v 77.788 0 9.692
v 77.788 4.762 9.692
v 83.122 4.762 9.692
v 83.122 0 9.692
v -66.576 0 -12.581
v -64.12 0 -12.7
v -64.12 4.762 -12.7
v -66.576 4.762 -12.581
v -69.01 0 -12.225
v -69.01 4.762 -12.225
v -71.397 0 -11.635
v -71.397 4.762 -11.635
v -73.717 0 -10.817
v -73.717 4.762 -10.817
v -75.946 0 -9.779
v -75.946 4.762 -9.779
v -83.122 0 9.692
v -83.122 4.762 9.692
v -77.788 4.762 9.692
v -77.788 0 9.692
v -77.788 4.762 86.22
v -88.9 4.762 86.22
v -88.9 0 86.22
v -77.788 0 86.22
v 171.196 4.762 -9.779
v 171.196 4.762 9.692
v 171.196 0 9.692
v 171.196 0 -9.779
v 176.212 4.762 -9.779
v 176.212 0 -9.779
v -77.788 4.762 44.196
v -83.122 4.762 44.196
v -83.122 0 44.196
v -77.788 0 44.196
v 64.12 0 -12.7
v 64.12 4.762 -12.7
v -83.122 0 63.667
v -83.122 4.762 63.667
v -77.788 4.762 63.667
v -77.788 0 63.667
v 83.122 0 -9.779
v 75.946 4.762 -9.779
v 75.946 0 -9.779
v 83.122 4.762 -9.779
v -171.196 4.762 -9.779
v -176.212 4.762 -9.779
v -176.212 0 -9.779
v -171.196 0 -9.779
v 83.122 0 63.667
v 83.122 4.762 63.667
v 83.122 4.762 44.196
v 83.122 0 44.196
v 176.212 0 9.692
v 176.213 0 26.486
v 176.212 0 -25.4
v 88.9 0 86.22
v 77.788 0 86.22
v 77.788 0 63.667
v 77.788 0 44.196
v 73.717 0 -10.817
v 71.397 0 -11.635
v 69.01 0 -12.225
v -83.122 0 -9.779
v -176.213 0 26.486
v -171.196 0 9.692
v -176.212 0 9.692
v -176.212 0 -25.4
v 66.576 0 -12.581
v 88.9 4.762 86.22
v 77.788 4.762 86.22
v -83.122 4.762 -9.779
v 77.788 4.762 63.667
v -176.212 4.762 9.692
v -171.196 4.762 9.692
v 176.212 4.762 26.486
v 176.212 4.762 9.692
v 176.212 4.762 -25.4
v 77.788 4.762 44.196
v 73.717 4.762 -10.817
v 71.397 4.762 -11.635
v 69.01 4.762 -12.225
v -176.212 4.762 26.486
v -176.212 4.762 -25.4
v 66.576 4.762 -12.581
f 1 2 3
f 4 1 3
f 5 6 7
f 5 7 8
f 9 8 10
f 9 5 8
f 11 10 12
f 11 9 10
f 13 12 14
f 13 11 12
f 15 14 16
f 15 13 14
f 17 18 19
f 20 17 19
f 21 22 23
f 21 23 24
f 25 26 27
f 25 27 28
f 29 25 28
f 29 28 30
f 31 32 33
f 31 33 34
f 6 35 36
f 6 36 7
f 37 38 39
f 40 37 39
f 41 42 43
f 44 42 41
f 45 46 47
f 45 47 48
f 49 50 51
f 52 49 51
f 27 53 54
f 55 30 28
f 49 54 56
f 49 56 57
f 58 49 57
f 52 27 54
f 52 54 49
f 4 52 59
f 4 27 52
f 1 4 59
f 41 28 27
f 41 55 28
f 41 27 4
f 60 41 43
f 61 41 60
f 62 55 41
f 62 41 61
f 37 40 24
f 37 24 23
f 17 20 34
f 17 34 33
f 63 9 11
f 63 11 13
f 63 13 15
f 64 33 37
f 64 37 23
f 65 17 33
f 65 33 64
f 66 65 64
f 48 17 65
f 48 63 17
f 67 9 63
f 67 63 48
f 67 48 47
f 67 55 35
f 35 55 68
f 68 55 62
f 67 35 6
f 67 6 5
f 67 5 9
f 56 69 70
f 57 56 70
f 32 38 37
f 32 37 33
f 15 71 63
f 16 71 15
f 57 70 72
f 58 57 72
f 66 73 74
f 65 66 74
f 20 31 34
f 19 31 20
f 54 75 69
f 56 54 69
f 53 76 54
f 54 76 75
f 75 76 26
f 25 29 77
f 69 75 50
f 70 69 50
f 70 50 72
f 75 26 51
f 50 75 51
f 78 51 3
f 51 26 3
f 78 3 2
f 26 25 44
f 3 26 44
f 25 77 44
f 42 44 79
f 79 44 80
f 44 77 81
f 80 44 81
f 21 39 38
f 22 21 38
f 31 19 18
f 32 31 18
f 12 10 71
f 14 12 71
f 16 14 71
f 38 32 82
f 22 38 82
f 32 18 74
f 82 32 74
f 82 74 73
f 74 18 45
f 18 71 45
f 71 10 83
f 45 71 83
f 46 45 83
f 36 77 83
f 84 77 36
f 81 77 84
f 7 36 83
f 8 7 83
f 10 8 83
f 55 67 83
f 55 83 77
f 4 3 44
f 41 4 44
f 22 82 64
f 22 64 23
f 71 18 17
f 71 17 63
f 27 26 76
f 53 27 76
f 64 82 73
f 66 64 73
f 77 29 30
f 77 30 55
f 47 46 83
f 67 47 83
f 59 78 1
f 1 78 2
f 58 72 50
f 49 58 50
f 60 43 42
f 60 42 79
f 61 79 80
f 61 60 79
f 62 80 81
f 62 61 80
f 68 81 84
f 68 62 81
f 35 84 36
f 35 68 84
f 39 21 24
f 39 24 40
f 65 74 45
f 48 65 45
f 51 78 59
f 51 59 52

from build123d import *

# Parameters (mm, degrees)
SKETCH1_W           = 355.6
SKETCH1_H           = 50.8
BOSS_EXTRUDE1_DEPTH = 4.7625
BOSS_EXTRUDE2_DEPTH = 4.7625
SKETCH3_W           = 6.858
SKETCH3_H           = 19.471321321
SKETCH3_W_2         = 6.35
SKETCH3_H_2         = 18.963321321
CUT_EXTRUDE1_DEPTH  = 198.660000053
SKETCH4_W           = 1.5875
SKETCH4_H           = 15.621
SKETCH4_H_2         = 22.553060346
CUT_EXTRUDE2_DEPTH  = 198.660000053
CUT_EXTRUDE3_DEPTH  = 197.233230563
SKETCH6_W           = 0.3175
SKETCH6_H           = 19.471321321
CUT_EXTRUDE4_DEPTH  = 197.233230563
SKETCH7_W           = 155.575
SKETCH7_H           = 76.528060346
CUT_EXTRUDE5_DEPTH  = 197.233230563


with BuildPart() as part:
    # Sketch1 → Boss-Extrude1 (new body)
    with BuildSketch(Plane(origin=(0, 0, 0), x_dir=(1, 0, 0), z_dir=(0, 1, 0))):
        Rectangle(SKETCH1_W, SKETCH1_H)
    extrude(amount=BOSS_EXTRUDE1_DEPTH)

    # Sketch2 → Boss-Extrude2 (add)
    with BuildSketch(Plane(origin=(0, 4.7625, 0), x_dir=(1, 0, 0), z_dir=(0, 1, 0))):
        Polygon((177.8, -25.4), (88.9, -86.220381667), (76.2, -86.220381667), (76.2, -25.4), align=None)
        Polygon((-177.8, -25.4), (-88.9, -86.220381667), (-76.2, -86.220381667), (-76.2, -25.4), align=None)
    extrude(amount=-BOSS_EXTRUDE2_DEPTH)

    # Sketch3 → Cut-Extrude1 (cut, through all)
    # profile 1 of 6: a face of its own
    with BuildSketch(Plane(origin=(0, 4.7625, 0), x_dir=(1, 0, 0), z_dir=(0, 1, 0))):
        with Locations((-174.625, 0.043339339)):
            Rectangle(SKETCH3_W, SKETCH3_H)
        with Locations((-174.625, 0.04333934)):
            Rectangle(SKETCH3_W_2, SKETCH3_H_2, mode=Mode.SUBTRACT)
    # profile 2 of 6: a face of its own
    with BuildSketch(Plane(origin=(0, 4.7625, 0), x_dir=(1, 0, 0), z_dir=(0, 1, 0))):
        with Locations((-79.375, -53.931660661)):
            Rectangle(SKETCH3_W, SKETCH3_H)
        with Locations((-79.375, -53.931660661)):
            Rectangle(SKETCH3_W_2, SKETCH3_H_2, mode=Mode.SUBTRACT)
    # profile 3 of 6: a face of its own
    with BuildSketch(Plane(origin=(0, 4.7625, 0), x_dir=(1, 0, 0), z_dir=(0, 1, 0))):
        with Locations((-79.375, 0.043339339)):
            Rectangle(SKETCH3_W, SKETCH3_H)
        with Locations((-79.375, 0.04333934)):
            Rectangle(SKETCH3_W_2, SKETCH3_H_2, mode=Mode.SUBTRACT)
    # profile 4 of 6: a face of its own
    with BuildSketch(Plane(origin=(0, 4.7625, 0), x_dir=(1, 0, 0), z_dir=(0, 1, 0))):
        with Locations((79.375, 0.043339339)):
            Rectangle(SKETCH3_W, SKETCH3_H)
        with Locations((79.375, 0.04333934)):
            Rectangle(SKETCH3_W_2, SKETCH3_H_2, mode=Mode.SUBTRACT)
    # profile 5 of 6: a face of its own
    with BuildSketch(Plane(origin=(0, 4.7625, 0), x_dir=(1, 0, 0), z_dir=(0, 1, 0))):
        with Locations((79.375, -53.931660661)):
            Rectangle(SKETCH3_W, SKETCH3_H)
        with Locations((79.375, -53.931660661)):
            Rectangle(SKETCH3_W_2, SKETCH3_H_2, mode=Mode.SUBTRACT)
    # profile 6 of 6: a face of its own
    with BuildSketch(Plane(origin=(0, 4.7625, 0), x_dir=(1, 0, 0), z_dir=(0, 1, 0))):
        with Locations((174.625, 0.043339339)):
            Rectangle(SKETCH3_W, SKETCH3_H)
        with Locations((174.625, 0.04333934)):
            Rectangle(SKETCH3_W_2, SKETCH3_H_2, mode=Mode.SUBTRACT)
    extrude(amount=-CUT_EXTRUDE1_DEPTH, mode=Mode.SUBTRACT)


with BuildPart() as body_2:
    # of the pieces the cut leaves, the one that is kept (cut_extrude1_keep)
    add(part.part.solids().sort_by_distance((-177.8, 0, -25.4))[0])

    # Sketch4 → Cut-Extrude2 (cut, through all)
    with BuildSketch(Plane(origin=(0, 4.7625, 0), x_dir=(1, 0, 0), z_dir=(0, 1, 0))):
        with Locations((-177.00625, 17.5895)):
            Rectangle(SKETCH4_W, SKETCH4_H)
        with Locations((177.00625, 17.5895)):
            Rectangle(SKETCH4_W, SKETCH4_H)
        Polygon((-176.2125, -26.486078244), (-176.2125, -9.692321321), (-177.8, -9.692321321), (-177.8, -25.4), align=None)
        Polygon((177.8, -9.692321321), (176.2125, -9.692321321), (176.2125, -26.486078244), (177.8, -25.4), align=None)
        with Locations((-76.99375, -74.943851494)):
            Rectangle(SKETCH4_W, SKETCH4_H_2)
        with Locations((76.99375, -74.943851494)):
            Rectangle(SKETCH4_W, SKETCH4_H_2)
    extrude(amount=-CUT_EXTRUDE2_DEPTH, mode=Mode.SUBTRACT)

    # Sketch5 → Cut-Extrude3 (cut, through all)
    with BuildSketch(Plane(origin=(0, 4.7625, 0), x_dir=(1, 0, 0), z_dir=(0, 1, 0))):
        with BuildLine():
            Line((-76.2, -9.692321321), (-76.2, -25.4))
            Line((-76.2, -25.4), (76.2, -25.4))
            Line((76.2, -25.4), (76.2, -9.692321321))
            Line((76.2, -9.692321321), (75.946, -9.692321321))
            Line((75.946, -9.692321321), (75.946, 9.779))
            ThreePointArc((75.946, 9.779), (70.210694069, 11.958939555), (64.119988035, 12.7))
            Line((64.119988035, 12.7), (-64.119988035, 12.7))
            ThreePointArc((-64.119988035, 12.7), (-70.210694069, 11.958939555), (-75.946, 9.779))
            Line((-75.946, 9.779), (-75.946, -9.692321321))
            Line((-75.946, -9.692321321), (-76.2, -9.692321321))
        make_face()
    extrude(amount=-CUT_EXTRUDE3_DEPTH, mode=Mode.SUBTRACT)

    # Sketch6 → Cut-Extrude4 (cut, through all)
    with BuildSketch(Plane(origin=(0, 4.7625, 0), x_dir=(1, 0, 0), z_dir=(0, 1, 0))):
        with Locations((-82.96275, 0.043339339)):
            Rectangle(SKETCH6_W, SKETCH6_H)
        with Locations((-82.96275, -53.931660661)):
            Rectangle(SKETCH6_W, SKETCH6_H)
        with Locations((82.96275, -53.931660661)):
            Rectangle(SKETCH6_W, SKETCH6_H)
        with Locations((82.96275, 0.043339339)):
            Rectangle(SKETCH6_W, SKETCH6_H)
    extrude(amount=-CUT_EXTRUDE4_DEPTH, mode=Mode.SUBTRACT)

    # Sketch7 → Cut-Extrude5 (cut, through all)
    with BuildSketch(Plane(origin=(0, 4.7625, 0), x_dir=(1, 0, 0), z_dir=(0, 1, 0))):
        with Locations((0, -47.956351494)):
            Rectangle(SKETCH7_W, SKETCH7_H)
    extrude(amount=-CUT_EXTRUDE5_DEPTH, mode=Mode.SUBTRACT)


solid = body_2.part
